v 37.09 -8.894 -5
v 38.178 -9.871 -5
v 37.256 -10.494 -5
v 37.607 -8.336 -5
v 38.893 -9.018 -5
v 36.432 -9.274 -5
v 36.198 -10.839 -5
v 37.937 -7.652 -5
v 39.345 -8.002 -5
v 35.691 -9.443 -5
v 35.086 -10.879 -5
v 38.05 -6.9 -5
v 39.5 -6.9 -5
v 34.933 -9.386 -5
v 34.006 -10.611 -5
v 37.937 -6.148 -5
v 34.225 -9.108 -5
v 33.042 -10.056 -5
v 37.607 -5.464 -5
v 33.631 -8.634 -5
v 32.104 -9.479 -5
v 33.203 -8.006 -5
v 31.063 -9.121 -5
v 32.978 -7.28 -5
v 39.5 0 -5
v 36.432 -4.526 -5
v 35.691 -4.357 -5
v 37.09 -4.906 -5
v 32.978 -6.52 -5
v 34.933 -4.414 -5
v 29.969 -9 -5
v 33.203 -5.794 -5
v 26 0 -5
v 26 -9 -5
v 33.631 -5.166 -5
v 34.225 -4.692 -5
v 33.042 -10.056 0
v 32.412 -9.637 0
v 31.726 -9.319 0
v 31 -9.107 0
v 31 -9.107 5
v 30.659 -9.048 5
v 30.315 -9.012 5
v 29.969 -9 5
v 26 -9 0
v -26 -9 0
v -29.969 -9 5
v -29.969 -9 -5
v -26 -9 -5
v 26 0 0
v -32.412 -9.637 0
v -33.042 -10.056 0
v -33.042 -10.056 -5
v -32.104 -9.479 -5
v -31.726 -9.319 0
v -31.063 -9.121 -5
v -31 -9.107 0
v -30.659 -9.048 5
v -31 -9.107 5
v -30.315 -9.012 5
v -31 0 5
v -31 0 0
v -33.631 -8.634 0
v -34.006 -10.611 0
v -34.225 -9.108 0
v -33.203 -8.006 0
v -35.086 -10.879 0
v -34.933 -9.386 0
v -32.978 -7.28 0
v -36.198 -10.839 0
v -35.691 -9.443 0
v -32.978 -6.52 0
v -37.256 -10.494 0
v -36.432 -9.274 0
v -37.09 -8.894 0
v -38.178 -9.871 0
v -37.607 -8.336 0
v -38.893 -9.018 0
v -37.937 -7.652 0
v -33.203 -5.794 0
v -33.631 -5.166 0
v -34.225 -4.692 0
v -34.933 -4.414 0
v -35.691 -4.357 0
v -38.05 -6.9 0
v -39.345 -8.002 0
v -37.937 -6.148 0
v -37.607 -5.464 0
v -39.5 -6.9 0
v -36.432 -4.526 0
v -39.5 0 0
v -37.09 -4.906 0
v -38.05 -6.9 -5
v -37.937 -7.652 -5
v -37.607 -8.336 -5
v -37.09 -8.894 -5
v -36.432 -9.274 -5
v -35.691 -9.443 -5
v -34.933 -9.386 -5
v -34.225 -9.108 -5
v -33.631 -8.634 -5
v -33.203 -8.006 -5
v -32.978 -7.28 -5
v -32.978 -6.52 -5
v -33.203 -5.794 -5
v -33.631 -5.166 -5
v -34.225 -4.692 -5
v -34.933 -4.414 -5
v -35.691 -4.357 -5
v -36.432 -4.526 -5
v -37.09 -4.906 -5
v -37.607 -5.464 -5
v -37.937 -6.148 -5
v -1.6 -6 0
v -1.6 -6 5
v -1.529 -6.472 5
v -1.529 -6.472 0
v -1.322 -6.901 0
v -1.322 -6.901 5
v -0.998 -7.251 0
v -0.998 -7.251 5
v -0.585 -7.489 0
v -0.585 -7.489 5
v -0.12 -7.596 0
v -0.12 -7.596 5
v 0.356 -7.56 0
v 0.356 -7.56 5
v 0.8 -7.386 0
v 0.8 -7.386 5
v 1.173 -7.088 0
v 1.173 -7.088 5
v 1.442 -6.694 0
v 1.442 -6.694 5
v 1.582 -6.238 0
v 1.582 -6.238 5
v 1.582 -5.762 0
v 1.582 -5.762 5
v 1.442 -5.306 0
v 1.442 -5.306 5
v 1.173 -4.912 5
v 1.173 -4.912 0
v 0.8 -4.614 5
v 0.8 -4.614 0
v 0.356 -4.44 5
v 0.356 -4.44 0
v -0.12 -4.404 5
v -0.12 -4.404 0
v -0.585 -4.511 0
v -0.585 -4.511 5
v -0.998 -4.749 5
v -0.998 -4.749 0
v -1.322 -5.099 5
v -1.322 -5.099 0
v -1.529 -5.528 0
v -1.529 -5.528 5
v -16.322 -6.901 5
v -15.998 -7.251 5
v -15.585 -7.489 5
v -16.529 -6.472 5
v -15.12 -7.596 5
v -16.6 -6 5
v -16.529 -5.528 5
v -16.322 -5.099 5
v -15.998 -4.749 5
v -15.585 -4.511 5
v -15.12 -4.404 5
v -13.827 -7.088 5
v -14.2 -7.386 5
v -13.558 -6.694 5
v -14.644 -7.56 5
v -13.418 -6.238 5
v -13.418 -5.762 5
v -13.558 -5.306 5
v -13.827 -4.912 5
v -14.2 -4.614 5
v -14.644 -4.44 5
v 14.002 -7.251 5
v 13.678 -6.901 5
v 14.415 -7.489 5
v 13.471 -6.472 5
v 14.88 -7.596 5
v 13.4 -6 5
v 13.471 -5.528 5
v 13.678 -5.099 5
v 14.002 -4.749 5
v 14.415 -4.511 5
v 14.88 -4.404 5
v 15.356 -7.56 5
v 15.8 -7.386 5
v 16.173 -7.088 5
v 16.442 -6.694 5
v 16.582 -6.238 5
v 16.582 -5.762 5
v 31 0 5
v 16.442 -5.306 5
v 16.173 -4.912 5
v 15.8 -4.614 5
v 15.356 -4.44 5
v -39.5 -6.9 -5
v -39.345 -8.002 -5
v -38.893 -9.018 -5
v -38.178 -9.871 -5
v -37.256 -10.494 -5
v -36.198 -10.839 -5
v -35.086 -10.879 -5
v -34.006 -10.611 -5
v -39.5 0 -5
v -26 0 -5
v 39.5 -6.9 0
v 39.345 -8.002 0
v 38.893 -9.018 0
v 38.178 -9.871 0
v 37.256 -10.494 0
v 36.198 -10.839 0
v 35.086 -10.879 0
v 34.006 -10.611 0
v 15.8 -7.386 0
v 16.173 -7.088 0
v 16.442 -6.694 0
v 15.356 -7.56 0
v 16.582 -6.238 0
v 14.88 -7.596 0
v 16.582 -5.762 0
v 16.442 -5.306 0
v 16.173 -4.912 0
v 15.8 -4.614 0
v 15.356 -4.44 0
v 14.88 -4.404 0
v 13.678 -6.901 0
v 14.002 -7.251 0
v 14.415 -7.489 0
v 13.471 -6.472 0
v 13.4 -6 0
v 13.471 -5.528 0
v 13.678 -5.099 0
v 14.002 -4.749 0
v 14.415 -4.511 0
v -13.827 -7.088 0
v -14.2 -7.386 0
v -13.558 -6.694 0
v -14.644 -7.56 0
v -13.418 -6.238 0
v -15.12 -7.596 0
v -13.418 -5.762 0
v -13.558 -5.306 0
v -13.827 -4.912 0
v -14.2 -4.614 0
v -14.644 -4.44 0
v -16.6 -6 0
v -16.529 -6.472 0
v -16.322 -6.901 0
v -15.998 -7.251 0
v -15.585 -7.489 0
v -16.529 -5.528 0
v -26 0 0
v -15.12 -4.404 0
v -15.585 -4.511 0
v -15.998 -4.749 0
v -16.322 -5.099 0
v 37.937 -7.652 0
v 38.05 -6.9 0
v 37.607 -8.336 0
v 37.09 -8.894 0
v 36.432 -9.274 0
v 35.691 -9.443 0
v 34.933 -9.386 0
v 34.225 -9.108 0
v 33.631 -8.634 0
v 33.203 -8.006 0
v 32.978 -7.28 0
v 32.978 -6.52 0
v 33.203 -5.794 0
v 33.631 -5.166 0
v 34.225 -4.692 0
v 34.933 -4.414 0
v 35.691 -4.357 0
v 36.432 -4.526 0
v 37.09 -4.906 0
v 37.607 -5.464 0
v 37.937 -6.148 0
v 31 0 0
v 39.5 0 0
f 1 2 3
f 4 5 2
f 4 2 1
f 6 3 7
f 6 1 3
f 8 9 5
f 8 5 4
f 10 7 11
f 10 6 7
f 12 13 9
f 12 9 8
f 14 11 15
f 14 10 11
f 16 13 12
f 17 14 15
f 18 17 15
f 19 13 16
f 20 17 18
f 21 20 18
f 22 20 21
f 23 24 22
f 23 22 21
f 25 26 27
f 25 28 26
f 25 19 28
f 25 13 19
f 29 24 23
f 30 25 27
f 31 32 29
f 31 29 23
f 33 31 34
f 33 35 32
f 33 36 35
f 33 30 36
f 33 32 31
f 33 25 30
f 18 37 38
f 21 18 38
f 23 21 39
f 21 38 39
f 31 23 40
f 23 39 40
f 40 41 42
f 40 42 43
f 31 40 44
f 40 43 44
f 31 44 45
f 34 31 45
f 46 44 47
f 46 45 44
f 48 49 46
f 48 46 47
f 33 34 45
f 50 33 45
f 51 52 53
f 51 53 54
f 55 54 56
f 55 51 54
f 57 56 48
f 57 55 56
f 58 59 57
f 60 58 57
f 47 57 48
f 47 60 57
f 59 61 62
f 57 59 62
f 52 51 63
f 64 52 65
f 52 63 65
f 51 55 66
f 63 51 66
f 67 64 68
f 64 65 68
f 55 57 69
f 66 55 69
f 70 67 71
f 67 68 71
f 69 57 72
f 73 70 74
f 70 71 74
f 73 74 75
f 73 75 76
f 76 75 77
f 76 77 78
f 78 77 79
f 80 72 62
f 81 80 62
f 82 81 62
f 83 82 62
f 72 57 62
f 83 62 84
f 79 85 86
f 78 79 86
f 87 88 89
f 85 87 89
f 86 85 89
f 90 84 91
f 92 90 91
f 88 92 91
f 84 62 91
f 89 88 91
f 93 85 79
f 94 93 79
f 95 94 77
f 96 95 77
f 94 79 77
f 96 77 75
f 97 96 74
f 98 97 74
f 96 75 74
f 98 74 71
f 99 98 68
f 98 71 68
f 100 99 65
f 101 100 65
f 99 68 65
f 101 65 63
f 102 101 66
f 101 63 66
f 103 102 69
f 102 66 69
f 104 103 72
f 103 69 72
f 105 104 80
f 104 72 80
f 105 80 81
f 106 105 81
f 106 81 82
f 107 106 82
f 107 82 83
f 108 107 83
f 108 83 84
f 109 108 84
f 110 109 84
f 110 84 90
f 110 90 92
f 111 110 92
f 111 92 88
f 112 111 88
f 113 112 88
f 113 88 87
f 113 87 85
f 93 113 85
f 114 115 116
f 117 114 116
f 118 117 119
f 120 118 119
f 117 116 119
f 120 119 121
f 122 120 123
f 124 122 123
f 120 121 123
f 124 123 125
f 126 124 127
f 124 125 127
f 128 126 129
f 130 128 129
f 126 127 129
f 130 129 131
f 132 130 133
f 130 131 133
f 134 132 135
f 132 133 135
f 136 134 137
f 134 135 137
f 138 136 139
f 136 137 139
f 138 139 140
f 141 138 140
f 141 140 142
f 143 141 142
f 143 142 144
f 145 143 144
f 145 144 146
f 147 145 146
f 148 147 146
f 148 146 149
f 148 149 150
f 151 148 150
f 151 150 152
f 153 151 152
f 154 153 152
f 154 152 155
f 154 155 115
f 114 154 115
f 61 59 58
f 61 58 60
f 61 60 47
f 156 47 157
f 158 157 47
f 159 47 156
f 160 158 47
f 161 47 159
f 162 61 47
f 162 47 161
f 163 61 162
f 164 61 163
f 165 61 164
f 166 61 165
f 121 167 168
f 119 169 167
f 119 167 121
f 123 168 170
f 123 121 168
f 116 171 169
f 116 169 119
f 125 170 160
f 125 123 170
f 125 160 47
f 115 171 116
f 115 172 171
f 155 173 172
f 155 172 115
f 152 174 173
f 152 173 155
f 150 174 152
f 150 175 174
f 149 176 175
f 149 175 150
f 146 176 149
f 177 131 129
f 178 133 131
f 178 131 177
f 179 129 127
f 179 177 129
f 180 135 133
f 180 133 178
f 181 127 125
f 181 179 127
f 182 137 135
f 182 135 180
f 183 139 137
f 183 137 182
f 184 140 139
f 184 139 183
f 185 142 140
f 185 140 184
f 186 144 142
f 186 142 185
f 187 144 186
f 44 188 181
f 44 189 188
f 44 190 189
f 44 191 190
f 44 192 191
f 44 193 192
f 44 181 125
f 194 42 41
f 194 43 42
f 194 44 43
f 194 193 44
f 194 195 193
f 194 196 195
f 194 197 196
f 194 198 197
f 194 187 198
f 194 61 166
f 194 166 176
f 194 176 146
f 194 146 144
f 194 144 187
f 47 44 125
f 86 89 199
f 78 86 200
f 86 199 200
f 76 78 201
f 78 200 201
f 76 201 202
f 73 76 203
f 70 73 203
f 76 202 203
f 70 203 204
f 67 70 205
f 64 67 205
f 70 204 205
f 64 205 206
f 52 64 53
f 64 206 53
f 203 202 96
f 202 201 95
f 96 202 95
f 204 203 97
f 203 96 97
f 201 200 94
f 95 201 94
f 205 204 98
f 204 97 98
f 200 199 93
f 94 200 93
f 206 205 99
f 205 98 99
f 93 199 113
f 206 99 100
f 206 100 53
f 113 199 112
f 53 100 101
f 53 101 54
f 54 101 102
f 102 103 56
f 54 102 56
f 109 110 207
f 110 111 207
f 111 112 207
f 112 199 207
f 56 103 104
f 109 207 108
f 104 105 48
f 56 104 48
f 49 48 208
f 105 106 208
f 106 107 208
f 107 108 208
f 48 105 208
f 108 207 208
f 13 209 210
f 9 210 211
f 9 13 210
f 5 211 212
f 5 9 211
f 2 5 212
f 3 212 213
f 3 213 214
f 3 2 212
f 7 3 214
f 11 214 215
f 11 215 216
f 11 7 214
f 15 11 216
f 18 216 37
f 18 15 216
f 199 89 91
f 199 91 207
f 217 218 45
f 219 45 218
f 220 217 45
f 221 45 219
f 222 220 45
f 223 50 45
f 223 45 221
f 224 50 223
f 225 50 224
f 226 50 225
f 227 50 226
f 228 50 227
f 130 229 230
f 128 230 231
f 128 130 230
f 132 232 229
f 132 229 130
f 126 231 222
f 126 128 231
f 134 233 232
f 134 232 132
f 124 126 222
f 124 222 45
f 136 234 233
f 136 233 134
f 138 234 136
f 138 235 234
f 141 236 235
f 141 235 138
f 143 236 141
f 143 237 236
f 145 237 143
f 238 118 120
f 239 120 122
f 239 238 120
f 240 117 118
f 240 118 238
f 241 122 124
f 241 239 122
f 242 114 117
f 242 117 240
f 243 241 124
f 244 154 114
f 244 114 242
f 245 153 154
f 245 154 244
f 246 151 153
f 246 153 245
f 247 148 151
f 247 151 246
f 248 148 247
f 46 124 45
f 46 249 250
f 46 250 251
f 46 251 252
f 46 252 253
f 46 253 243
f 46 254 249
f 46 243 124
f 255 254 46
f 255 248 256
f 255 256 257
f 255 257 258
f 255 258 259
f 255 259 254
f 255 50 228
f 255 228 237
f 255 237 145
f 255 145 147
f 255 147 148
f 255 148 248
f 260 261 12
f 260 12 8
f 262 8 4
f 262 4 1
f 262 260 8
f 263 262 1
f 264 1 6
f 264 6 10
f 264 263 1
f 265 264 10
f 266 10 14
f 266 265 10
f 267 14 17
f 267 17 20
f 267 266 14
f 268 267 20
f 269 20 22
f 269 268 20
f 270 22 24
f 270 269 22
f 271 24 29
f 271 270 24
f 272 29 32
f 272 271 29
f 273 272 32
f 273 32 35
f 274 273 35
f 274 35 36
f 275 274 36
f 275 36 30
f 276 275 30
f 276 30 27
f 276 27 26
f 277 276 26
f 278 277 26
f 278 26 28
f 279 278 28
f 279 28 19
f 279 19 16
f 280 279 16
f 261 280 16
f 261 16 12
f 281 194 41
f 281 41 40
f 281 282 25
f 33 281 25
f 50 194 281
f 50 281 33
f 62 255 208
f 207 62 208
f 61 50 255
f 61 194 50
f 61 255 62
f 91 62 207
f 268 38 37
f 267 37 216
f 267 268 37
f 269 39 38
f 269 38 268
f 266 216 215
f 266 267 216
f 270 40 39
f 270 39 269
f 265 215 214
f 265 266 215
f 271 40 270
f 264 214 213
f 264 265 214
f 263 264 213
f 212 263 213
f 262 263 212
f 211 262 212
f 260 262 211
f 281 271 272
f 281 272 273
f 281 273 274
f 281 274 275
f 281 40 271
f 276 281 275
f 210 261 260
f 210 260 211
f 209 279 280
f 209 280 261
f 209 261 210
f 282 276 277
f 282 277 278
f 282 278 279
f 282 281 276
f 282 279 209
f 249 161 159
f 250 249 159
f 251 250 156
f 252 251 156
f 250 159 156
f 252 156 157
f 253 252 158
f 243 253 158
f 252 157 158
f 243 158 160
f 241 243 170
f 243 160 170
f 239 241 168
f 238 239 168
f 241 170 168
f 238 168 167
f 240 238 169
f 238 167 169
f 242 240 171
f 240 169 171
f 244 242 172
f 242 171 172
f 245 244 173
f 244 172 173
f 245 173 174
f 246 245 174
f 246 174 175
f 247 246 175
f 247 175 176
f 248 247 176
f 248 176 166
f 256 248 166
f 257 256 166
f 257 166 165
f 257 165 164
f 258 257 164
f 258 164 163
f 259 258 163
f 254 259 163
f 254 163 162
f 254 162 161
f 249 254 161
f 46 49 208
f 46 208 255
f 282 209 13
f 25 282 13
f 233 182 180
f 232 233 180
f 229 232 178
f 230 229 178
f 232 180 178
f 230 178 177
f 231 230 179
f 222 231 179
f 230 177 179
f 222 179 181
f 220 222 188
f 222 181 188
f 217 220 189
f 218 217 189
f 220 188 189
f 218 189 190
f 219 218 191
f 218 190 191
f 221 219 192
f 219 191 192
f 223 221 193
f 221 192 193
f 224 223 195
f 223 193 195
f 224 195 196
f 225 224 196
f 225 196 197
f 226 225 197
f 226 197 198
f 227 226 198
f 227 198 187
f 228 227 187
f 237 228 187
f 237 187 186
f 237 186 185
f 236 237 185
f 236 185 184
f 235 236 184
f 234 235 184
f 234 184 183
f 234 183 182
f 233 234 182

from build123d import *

# Parameters (mm, degrees)
F1_DEPTH = 10.9
F3_DEPTH = 10
F4_R     = 5
F6_D     = 5.1
F9_D     = 3.2


with BuildPart() as f1:
    # F0 (on Front) → F1 (new body)
    with BuildSketch(Plane.XZ):
        Polygon((-26, 0), (0, 0), (0, 5), (-31, 5), (-31, 0), (-39.5, 0), (-39.5, -5), (-26, -5), align=None)
    extrude(amount=F1_DEPTH)

    # F2 (on face) → F3 (cut, through all)
    with BuildSketch(Plane(origin=(0, 0, -5), x_dir=(1, 0, 0), z_dir=(0, 0, -1))):
        with BuildLine():
            ThreePointArc((-39.5, 6.9), (-36.5914129318, 10.7482226823), (-32.0955910939, 9))
            Line((-32.0955910939, 9), (0, 9))
            Line((0, 9), (0, 12.9))
            Line((0, 12.9), (-39.5, 12.9))
            Line((-39.5, 12.9), (-39.5, 6.9))
        make_face()
    extrude(amount=-F3_DEPTH, mode=Mode.SUBTRACT)

    # F4
    f4_edges = [f1.edges().sort_by_distance(p)[0] for p in [
        (-32.095591, -9, -2.5),
    ]]
    fillet(f4_edges, radius=F4_R)

    # F6 (through all)
    with Locations(Plane(origin=(0, 0, -5), x_dir=(1, 0, 0), z_dir=(0, 0, -1))):
        with Locations((-35.5, 6.9)):
            Hole(F6_D / 2)

    # F7: F1 across face


with BuildPart() as f1_1:
    add(f1.part)
    add(f1.part.mirror(Plane(origin=(0, -4.5, 2.5), x_dir=(0, 1, 0), z_dir=(1, 0, 0))))

    # F9 (through all)
    with Locations(Plane(origin=(0, 0, 0), x_dir=(1, 0, 0), z_dir=(0, 0, -1))):
        with Locations((-15, 6), (0, 6), (15, 6)):
            Hole(F9_D / 2)


solid = f1_1.part
